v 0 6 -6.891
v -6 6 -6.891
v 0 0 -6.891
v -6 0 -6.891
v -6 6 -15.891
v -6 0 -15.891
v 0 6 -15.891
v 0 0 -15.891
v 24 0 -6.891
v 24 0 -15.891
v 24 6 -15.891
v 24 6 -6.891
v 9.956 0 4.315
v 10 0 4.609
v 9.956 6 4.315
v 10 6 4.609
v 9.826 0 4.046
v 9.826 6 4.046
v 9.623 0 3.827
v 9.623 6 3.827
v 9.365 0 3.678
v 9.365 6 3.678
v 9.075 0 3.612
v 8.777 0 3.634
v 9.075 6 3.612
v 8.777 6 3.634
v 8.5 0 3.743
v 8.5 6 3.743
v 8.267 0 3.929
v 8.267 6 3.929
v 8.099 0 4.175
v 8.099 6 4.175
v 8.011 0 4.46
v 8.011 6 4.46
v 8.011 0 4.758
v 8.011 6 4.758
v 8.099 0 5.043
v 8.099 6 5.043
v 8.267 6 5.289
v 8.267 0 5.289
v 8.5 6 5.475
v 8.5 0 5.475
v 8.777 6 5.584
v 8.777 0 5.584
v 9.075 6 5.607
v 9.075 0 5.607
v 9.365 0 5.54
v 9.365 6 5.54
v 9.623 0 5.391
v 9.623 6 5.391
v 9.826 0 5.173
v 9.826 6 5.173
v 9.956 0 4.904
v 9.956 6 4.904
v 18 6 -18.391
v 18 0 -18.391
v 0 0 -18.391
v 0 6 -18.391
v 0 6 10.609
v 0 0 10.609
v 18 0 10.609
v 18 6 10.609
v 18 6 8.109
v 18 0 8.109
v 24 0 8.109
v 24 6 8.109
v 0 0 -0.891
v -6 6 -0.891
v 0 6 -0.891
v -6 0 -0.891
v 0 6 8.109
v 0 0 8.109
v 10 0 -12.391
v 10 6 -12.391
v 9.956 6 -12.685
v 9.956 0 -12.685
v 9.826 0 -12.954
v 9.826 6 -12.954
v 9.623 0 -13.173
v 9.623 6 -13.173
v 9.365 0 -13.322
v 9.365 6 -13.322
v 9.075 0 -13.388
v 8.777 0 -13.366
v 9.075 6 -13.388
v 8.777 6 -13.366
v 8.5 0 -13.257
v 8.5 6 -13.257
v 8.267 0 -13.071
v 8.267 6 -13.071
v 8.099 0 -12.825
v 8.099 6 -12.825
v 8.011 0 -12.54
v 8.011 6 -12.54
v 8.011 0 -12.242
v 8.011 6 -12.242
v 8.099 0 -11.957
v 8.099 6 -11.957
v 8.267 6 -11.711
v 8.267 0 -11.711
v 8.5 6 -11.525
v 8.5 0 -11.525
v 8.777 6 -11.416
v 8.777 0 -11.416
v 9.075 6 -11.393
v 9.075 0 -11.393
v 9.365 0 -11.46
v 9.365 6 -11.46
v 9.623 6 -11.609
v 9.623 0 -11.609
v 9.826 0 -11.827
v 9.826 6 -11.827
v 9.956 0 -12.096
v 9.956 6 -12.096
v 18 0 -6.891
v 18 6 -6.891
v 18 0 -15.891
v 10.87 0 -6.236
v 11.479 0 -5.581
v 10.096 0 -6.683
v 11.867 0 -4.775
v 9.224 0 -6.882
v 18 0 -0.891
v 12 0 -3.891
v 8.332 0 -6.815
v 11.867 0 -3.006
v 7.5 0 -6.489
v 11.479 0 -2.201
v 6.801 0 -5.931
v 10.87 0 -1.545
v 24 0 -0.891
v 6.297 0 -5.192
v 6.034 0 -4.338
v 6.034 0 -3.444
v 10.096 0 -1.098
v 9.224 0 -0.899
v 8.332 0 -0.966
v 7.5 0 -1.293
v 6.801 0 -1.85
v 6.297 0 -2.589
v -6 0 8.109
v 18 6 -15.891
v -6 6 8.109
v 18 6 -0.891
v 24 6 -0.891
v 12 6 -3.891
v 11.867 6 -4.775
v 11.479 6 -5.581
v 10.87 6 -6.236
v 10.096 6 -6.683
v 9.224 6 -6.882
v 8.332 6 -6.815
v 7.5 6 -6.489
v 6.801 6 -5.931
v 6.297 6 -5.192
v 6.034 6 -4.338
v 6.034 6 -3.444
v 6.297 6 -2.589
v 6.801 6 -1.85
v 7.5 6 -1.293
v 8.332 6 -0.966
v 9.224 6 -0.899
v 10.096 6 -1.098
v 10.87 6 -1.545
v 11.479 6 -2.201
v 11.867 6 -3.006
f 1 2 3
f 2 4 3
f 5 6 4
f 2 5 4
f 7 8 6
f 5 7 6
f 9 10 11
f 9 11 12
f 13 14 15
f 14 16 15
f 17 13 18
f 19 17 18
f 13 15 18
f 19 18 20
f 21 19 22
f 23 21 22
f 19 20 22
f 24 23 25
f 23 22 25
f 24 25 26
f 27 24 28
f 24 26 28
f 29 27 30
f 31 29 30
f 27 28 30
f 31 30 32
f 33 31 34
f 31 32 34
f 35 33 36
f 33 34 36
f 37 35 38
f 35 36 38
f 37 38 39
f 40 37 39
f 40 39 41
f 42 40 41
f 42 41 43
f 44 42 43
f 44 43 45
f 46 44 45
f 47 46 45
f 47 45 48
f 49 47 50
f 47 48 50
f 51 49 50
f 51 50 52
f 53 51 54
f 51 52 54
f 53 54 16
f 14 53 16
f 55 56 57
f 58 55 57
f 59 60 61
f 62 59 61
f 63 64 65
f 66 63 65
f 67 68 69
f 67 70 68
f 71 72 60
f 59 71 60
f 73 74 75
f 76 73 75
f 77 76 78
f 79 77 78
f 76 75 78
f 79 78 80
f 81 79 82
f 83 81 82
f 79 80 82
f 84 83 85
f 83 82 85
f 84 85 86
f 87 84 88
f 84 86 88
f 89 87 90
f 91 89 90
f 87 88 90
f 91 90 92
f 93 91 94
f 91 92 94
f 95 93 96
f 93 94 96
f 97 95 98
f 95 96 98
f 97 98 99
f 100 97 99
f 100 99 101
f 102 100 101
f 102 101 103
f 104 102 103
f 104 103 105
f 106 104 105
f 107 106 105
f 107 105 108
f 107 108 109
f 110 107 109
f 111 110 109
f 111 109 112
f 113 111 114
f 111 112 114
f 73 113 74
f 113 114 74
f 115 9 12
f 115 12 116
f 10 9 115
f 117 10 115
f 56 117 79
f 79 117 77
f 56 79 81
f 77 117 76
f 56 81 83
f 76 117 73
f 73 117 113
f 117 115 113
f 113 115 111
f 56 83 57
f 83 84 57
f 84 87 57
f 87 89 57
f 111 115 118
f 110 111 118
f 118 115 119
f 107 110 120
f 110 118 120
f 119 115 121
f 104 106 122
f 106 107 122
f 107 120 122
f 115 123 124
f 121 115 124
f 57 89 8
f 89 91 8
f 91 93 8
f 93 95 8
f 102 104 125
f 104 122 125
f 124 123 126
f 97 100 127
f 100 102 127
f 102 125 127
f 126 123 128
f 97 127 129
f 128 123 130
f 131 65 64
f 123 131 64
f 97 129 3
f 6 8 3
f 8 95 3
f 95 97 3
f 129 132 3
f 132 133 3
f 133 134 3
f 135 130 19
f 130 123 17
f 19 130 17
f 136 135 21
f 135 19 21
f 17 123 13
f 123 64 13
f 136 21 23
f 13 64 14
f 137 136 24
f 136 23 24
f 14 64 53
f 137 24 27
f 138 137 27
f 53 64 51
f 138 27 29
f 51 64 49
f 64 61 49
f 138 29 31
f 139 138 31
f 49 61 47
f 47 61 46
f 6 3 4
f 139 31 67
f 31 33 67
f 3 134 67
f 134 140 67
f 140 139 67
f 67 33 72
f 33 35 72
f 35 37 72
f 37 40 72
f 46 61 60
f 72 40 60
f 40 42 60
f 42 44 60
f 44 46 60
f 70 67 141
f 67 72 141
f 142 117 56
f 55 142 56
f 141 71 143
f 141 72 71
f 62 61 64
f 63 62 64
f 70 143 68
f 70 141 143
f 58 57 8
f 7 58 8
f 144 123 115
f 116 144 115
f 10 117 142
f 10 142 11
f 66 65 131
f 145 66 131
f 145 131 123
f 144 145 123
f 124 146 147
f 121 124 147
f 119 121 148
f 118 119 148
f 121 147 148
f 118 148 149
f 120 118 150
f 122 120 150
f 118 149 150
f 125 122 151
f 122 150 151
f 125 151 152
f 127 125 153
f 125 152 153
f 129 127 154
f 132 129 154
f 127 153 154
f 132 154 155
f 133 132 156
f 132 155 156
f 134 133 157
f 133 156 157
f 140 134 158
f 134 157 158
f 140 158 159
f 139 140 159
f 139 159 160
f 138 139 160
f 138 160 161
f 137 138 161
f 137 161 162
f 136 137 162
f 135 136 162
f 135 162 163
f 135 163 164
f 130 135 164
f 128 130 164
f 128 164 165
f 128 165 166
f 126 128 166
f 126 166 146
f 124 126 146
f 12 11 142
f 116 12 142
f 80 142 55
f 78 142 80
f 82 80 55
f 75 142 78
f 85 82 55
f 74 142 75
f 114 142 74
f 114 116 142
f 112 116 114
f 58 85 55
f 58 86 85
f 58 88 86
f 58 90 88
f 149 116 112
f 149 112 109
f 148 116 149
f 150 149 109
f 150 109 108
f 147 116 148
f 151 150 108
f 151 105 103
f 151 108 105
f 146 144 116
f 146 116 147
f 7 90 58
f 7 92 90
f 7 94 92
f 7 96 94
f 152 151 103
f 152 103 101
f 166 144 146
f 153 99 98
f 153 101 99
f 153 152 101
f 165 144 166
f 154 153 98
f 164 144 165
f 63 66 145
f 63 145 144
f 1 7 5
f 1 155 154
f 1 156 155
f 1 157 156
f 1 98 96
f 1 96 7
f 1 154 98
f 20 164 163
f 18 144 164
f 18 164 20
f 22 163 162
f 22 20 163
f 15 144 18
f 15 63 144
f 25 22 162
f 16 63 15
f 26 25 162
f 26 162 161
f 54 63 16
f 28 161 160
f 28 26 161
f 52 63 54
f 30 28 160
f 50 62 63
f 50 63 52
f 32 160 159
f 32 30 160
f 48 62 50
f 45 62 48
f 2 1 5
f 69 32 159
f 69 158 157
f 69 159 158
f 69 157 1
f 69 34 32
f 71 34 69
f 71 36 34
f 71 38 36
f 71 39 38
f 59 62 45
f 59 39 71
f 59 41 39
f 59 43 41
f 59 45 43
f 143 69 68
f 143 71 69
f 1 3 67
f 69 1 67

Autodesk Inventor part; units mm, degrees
ref_plane "YZ Plane" through (0, 0, 0) normal (1, 0, 0) x (0, 1, 0)
ref_plane "XZ Plane" through (0, 0, 0) normal (0, 1, 0) x (-1, 0, 0)
ref_plane "XY Plane" through (0, 0, 0) normal (0, 0, 1) x (1, 0, 0)
sketch "Sketch1" plane through (0, 0, 0) normal (0, 1, 0) x (-1, 0, 0)
  line L0 (0, 10.6093) -> (-18, 10.6093)
  line L1 (-18, 10.6093) -> (-18, -18.3907)
  line L2 (-18, -18.3907) -> (0, -18.3907)
  line L3 (0, -15.8907) -> (6, -15.8907)
  line L4 (6, -15.8907) -> (6, -6.8907)
  line L5 (6, -6.8907) -> (0, -6.8907)
  line L6 (0, -6.8907) -> (0, -15.8907)
  line L7 (0, -3.8907) -> (-9, -3.8907) construction
  line L8 (-9, -18.3907) -> (-9, 10.6093) construction
  line L9 (0, 8.1093) -> (6, 8.1093)
  line L10 (6, 8.1093) -> (6, -0.8907)
  line L11 (6, -0.8907) -> (0, -0.8907)
  line L12 (0, -0.8907) -> (0, 8.1093)
  line L13 (-18, -15.8907) -> (-24, -15.8907)
  line L14 (-24, -15.8907) -> (-24, -6.8907)
  line L15 (-24, -6.8907) -> (-18, -6.8907)
  line L16 (-18, -6.8907) -> (-18, -15.8907)
  line L17 (-18, 8.1093) -> (-24, 8.1093)
  line L18 (-24, 8.1093) -> (-24, -0.8907)
  line L19 (-24, -0.8907) -> (-18, -0.8907)
  line L20 (-18, -0.8907) -> (-18, 8.1093)
  line L21 (0, -15.8907) -> (0, 8.1093)
  line L22 (-9, -3.8907) -> (-18, -3.8907) construction
  line L23 (0, -18.3907) -> (0, 10.6093)
  dimension "d49" = 18
  dimension "d50" = 29
  dimension "d54" = 9
  dimension "d60" = 6
  dimension "d76" = 6
  dimension "d87" = 30
extrude "Extrusion1" add sketch "Sketch1" along normal blind 6
sketch "Sketch3" plane through (0, 6, 0) normal (0, 1, 0) x (1, 0, 0)
  line L0 (18, 18.3907) -> (0, 18.3907) construction
  line L1 (9, 18.3907) -> (9, -10.6093) construction
  line L2 (0, -10.6093) -> (18, -10.6093) construction
  line L3 (0, 0.8907) -> (0, 6.8907) construction
  line L4 (0, 3.8907) -> (18, 3.8907) construction
  line L5 (18, 0.8907) -> (18, 6.8907) construction
  circle A0 centre (9, 12.3907) radius 1
  circle A1 centre (9, -4.6093) radius 1
  circle A2 centre (9, 3.8907) radius 3
  point P0 (0, 0)
  dimension "d91" = 2
  dimension "d92" = 8.5
  dimension "d96" = 6
extrude "Extrusion3" cut sketch "Sketch3" against normal through all
properties part number "thumper-bumper-top-v3"
